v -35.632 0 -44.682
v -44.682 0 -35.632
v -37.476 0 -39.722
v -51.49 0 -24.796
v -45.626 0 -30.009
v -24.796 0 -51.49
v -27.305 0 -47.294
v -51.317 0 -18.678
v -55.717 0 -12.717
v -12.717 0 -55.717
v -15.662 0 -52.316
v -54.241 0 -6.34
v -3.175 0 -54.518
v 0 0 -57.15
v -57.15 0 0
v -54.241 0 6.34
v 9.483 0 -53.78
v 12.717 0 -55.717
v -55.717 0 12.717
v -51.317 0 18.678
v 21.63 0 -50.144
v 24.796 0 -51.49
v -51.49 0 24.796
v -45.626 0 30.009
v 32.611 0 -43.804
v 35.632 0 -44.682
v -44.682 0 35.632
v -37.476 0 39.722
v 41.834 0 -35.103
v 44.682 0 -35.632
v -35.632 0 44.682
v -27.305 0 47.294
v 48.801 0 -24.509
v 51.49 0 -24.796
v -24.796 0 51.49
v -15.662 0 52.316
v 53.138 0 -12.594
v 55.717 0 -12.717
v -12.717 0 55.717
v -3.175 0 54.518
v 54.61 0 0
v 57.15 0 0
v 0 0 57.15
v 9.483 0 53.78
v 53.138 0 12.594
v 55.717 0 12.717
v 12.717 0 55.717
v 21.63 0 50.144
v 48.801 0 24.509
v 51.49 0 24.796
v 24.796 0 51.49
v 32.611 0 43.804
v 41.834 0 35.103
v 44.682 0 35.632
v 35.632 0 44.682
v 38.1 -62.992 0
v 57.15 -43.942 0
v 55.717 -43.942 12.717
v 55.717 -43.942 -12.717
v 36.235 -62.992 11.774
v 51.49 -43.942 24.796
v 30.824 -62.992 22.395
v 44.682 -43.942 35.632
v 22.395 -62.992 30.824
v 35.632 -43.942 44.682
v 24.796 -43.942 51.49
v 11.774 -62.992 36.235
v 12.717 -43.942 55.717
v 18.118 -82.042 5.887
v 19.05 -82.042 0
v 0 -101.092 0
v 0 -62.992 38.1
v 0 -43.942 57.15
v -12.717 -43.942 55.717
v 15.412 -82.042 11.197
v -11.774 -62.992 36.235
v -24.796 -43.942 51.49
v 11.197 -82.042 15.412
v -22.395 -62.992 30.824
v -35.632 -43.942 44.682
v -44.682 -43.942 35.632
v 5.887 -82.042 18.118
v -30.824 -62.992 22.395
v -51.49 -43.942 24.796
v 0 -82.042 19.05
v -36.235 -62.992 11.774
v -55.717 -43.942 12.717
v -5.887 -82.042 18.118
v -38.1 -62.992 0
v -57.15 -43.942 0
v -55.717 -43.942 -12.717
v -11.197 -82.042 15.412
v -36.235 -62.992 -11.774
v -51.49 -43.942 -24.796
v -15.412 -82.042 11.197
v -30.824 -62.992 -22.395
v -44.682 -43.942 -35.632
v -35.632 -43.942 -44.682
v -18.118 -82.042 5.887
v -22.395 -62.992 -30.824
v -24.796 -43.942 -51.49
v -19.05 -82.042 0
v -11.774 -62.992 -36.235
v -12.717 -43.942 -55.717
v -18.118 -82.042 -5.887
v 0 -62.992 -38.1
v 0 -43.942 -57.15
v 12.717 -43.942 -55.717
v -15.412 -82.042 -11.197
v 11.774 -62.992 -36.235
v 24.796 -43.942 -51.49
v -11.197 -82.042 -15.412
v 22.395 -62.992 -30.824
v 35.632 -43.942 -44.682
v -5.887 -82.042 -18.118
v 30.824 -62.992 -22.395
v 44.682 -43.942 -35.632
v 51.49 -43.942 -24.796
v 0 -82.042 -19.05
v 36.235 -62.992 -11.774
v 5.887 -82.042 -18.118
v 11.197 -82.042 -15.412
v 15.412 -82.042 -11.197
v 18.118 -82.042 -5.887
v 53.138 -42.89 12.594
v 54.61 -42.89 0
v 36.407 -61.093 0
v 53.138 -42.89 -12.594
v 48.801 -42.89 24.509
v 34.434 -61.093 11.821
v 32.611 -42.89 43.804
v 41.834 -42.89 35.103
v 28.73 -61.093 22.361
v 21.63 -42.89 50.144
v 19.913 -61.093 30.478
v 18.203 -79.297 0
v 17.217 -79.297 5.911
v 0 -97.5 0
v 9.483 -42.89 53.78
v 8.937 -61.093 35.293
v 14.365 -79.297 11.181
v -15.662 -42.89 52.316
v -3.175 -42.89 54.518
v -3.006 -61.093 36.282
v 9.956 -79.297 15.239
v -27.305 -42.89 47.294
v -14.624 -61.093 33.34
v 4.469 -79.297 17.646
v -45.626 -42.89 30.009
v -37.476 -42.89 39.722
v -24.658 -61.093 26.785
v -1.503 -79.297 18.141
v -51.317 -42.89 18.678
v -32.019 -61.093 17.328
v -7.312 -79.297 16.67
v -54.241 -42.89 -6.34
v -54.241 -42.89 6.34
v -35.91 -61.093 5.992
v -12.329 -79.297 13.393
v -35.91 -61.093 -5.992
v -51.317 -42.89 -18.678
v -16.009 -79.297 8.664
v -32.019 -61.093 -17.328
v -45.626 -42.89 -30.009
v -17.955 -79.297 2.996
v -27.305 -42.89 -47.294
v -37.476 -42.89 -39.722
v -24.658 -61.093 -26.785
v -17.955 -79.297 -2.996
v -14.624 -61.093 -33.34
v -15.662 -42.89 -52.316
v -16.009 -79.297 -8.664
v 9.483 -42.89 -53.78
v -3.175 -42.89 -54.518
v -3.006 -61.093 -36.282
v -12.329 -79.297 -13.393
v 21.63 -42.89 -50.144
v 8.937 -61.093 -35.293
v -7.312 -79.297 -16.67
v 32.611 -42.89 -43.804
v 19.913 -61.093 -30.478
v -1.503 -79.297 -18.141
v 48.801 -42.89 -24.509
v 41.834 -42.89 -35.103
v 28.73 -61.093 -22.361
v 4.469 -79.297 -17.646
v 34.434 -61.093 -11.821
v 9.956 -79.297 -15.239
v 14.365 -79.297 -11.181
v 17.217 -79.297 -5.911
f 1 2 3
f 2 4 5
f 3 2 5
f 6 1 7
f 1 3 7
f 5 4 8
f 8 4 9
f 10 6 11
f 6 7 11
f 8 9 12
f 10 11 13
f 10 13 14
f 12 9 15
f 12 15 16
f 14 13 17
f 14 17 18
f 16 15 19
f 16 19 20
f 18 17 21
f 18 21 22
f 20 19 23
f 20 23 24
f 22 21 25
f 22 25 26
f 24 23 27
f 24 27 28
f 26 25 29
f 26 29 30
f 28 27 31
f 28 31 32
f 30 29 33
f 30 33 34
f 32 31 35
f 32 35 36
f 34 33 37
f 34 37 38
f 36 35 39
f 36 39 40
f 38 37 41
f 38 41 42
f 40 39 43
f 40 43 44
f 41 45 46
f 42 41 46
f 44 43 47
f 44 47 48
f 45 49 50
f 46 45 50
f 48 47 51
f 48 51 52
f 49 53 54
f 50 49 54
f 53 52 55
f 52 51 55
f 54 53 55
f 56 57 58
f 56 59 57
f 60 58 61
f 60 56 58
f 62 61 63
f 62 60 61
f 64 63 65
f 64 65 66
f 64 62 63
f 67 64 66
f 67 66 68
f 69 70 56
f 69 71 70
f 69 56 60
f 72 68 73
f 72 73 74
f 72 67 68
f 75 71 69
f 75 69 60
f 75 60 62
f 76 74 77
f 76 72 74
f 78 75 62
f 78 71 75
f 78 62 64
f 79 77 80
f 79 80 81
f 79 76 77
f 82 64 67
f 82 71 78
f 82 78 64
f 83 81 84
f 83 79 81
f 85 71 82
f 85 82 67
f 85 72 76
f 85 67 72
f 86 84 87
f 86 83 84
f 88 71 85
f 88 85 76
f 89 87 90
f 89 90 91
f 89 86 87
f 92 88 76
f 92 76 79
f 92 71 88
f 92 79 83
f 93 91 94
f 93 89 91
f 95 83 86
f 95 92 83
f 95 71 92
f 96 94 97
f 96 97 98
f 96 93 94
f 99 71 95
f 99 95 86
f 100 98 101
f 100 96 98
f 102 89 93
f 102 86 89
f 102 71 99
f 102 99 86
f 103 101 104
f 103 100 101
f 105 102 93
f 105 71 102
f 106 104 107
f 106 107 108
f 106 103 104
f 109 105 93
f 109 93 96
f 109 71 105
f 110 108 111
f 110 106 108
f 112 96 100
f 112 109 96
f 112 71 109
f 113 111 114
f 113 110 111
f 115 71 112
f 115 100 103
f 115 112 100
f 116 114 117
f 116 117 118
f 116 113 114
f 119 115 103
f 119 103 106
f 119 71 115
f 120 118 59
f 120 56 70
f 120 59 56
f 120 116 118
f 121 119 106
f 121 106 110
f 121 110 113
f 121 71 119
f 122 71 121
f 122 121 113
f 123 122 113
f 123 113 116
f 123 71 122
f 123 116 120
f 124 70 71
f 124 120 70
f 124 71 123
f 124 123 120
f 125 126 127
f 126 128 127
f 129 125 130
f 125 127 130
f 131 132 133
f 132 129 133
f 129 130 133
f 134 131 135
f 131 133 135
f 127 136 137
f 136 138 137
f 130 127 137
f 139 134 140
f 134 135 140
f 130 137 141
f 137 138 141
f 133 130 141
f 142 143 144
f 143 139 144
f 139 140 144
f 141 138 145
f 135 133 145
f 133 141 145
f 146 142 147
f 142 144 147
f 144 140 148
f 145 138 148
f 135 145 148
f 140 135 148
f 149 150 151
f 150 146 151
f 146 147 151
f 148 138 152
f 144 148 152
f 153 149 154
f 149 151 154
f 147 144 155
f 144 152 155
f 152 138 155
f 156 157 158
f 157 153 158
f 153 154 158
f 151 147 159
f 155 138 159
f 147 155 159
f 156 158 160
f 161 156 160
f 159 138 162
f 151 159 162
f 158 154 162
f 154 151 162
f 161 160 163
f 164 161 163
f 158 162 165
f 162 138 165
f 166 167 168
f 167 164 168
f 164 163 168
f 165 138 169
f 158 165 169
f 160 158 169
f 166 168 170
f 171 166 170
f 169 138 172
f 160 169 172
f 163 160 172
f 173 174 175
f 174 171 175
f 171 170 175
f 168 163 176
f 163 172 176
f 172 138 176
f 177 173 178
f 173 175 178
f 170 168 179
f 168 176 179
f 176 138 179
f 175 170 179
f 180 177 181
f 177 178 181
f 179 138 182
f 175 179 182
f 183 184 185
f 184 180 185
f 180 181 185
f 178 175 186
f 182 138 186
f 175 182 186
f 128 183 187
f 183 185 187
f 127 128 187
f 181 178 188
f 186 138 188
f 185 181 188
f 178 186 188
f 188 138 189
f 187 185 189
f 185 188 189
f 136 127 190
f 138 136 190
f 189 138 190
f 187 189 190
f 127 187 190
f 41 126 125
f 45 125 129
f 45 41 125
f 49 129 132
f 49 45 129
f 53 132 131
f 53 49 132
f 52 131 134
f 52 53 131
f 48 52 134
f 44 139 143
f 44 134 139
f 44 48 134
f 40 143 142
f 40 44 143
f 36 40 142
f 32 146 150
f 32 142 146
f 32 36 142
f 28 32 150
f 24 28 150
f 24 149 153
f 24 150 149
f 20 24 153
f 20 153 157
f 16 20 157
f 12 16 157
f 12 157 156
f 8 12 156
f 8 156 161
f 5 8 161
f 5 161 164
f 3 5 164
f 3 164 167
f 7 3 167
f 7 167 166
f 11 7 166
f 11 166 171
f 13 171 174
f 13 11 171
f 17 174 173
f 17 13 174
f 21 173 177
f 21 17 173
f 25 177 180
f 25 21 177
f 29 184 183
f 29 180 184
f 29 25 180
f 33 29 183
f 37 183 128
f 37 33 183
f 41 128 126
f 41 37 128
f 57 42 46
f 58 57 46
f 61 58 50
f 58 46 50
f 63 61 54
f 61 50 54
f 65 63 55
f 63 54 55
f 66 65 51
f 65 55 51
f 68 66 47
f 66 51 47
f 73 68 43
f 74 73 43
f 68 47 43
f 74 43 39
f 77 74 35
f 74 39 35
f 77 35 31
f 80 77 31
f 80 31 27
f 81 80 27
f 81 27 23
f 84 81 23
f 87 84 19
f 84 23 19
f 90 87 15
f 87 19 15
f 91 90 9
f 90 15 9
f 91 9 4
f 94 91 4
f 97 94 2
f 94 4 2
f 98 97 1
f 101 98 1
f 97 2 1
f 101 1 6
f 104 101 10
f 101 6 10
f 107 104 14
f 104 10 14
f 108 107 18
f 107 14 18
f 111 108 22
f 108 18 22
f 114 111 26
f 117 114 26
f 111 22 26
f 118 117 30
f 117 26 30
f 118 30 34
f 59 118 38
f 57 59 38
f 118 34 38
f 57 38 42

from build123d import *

# Parameters (mm, degrees)
F0_R     = 57.15
F1_DEPTH = 101.092
F2_SIZE  = 57.15
F3_T     = -2.54


with BuildPart() as f1:
    # F0 (on Front) → F1 (new body)
    with BuildSketch(Plane.XZ):
        Circle(F0_R)
    extrude(amount=F1_DEPTH)

    # F2
    f2_edges = [f1.edges().sort_by_distance(p)[0] for p in [
        (-57.15, -101.092, 0),
    ]]
    chamfer(f2_edges, length=F2_SIZE)

    # F3
    f3_openings = [f1.faces().sort_by_distance(p)[0] for p in [
        (0, 0, 0),
    ]]
    offset(amount=F3_T, openings=f3_openings)


solid = f1.part
